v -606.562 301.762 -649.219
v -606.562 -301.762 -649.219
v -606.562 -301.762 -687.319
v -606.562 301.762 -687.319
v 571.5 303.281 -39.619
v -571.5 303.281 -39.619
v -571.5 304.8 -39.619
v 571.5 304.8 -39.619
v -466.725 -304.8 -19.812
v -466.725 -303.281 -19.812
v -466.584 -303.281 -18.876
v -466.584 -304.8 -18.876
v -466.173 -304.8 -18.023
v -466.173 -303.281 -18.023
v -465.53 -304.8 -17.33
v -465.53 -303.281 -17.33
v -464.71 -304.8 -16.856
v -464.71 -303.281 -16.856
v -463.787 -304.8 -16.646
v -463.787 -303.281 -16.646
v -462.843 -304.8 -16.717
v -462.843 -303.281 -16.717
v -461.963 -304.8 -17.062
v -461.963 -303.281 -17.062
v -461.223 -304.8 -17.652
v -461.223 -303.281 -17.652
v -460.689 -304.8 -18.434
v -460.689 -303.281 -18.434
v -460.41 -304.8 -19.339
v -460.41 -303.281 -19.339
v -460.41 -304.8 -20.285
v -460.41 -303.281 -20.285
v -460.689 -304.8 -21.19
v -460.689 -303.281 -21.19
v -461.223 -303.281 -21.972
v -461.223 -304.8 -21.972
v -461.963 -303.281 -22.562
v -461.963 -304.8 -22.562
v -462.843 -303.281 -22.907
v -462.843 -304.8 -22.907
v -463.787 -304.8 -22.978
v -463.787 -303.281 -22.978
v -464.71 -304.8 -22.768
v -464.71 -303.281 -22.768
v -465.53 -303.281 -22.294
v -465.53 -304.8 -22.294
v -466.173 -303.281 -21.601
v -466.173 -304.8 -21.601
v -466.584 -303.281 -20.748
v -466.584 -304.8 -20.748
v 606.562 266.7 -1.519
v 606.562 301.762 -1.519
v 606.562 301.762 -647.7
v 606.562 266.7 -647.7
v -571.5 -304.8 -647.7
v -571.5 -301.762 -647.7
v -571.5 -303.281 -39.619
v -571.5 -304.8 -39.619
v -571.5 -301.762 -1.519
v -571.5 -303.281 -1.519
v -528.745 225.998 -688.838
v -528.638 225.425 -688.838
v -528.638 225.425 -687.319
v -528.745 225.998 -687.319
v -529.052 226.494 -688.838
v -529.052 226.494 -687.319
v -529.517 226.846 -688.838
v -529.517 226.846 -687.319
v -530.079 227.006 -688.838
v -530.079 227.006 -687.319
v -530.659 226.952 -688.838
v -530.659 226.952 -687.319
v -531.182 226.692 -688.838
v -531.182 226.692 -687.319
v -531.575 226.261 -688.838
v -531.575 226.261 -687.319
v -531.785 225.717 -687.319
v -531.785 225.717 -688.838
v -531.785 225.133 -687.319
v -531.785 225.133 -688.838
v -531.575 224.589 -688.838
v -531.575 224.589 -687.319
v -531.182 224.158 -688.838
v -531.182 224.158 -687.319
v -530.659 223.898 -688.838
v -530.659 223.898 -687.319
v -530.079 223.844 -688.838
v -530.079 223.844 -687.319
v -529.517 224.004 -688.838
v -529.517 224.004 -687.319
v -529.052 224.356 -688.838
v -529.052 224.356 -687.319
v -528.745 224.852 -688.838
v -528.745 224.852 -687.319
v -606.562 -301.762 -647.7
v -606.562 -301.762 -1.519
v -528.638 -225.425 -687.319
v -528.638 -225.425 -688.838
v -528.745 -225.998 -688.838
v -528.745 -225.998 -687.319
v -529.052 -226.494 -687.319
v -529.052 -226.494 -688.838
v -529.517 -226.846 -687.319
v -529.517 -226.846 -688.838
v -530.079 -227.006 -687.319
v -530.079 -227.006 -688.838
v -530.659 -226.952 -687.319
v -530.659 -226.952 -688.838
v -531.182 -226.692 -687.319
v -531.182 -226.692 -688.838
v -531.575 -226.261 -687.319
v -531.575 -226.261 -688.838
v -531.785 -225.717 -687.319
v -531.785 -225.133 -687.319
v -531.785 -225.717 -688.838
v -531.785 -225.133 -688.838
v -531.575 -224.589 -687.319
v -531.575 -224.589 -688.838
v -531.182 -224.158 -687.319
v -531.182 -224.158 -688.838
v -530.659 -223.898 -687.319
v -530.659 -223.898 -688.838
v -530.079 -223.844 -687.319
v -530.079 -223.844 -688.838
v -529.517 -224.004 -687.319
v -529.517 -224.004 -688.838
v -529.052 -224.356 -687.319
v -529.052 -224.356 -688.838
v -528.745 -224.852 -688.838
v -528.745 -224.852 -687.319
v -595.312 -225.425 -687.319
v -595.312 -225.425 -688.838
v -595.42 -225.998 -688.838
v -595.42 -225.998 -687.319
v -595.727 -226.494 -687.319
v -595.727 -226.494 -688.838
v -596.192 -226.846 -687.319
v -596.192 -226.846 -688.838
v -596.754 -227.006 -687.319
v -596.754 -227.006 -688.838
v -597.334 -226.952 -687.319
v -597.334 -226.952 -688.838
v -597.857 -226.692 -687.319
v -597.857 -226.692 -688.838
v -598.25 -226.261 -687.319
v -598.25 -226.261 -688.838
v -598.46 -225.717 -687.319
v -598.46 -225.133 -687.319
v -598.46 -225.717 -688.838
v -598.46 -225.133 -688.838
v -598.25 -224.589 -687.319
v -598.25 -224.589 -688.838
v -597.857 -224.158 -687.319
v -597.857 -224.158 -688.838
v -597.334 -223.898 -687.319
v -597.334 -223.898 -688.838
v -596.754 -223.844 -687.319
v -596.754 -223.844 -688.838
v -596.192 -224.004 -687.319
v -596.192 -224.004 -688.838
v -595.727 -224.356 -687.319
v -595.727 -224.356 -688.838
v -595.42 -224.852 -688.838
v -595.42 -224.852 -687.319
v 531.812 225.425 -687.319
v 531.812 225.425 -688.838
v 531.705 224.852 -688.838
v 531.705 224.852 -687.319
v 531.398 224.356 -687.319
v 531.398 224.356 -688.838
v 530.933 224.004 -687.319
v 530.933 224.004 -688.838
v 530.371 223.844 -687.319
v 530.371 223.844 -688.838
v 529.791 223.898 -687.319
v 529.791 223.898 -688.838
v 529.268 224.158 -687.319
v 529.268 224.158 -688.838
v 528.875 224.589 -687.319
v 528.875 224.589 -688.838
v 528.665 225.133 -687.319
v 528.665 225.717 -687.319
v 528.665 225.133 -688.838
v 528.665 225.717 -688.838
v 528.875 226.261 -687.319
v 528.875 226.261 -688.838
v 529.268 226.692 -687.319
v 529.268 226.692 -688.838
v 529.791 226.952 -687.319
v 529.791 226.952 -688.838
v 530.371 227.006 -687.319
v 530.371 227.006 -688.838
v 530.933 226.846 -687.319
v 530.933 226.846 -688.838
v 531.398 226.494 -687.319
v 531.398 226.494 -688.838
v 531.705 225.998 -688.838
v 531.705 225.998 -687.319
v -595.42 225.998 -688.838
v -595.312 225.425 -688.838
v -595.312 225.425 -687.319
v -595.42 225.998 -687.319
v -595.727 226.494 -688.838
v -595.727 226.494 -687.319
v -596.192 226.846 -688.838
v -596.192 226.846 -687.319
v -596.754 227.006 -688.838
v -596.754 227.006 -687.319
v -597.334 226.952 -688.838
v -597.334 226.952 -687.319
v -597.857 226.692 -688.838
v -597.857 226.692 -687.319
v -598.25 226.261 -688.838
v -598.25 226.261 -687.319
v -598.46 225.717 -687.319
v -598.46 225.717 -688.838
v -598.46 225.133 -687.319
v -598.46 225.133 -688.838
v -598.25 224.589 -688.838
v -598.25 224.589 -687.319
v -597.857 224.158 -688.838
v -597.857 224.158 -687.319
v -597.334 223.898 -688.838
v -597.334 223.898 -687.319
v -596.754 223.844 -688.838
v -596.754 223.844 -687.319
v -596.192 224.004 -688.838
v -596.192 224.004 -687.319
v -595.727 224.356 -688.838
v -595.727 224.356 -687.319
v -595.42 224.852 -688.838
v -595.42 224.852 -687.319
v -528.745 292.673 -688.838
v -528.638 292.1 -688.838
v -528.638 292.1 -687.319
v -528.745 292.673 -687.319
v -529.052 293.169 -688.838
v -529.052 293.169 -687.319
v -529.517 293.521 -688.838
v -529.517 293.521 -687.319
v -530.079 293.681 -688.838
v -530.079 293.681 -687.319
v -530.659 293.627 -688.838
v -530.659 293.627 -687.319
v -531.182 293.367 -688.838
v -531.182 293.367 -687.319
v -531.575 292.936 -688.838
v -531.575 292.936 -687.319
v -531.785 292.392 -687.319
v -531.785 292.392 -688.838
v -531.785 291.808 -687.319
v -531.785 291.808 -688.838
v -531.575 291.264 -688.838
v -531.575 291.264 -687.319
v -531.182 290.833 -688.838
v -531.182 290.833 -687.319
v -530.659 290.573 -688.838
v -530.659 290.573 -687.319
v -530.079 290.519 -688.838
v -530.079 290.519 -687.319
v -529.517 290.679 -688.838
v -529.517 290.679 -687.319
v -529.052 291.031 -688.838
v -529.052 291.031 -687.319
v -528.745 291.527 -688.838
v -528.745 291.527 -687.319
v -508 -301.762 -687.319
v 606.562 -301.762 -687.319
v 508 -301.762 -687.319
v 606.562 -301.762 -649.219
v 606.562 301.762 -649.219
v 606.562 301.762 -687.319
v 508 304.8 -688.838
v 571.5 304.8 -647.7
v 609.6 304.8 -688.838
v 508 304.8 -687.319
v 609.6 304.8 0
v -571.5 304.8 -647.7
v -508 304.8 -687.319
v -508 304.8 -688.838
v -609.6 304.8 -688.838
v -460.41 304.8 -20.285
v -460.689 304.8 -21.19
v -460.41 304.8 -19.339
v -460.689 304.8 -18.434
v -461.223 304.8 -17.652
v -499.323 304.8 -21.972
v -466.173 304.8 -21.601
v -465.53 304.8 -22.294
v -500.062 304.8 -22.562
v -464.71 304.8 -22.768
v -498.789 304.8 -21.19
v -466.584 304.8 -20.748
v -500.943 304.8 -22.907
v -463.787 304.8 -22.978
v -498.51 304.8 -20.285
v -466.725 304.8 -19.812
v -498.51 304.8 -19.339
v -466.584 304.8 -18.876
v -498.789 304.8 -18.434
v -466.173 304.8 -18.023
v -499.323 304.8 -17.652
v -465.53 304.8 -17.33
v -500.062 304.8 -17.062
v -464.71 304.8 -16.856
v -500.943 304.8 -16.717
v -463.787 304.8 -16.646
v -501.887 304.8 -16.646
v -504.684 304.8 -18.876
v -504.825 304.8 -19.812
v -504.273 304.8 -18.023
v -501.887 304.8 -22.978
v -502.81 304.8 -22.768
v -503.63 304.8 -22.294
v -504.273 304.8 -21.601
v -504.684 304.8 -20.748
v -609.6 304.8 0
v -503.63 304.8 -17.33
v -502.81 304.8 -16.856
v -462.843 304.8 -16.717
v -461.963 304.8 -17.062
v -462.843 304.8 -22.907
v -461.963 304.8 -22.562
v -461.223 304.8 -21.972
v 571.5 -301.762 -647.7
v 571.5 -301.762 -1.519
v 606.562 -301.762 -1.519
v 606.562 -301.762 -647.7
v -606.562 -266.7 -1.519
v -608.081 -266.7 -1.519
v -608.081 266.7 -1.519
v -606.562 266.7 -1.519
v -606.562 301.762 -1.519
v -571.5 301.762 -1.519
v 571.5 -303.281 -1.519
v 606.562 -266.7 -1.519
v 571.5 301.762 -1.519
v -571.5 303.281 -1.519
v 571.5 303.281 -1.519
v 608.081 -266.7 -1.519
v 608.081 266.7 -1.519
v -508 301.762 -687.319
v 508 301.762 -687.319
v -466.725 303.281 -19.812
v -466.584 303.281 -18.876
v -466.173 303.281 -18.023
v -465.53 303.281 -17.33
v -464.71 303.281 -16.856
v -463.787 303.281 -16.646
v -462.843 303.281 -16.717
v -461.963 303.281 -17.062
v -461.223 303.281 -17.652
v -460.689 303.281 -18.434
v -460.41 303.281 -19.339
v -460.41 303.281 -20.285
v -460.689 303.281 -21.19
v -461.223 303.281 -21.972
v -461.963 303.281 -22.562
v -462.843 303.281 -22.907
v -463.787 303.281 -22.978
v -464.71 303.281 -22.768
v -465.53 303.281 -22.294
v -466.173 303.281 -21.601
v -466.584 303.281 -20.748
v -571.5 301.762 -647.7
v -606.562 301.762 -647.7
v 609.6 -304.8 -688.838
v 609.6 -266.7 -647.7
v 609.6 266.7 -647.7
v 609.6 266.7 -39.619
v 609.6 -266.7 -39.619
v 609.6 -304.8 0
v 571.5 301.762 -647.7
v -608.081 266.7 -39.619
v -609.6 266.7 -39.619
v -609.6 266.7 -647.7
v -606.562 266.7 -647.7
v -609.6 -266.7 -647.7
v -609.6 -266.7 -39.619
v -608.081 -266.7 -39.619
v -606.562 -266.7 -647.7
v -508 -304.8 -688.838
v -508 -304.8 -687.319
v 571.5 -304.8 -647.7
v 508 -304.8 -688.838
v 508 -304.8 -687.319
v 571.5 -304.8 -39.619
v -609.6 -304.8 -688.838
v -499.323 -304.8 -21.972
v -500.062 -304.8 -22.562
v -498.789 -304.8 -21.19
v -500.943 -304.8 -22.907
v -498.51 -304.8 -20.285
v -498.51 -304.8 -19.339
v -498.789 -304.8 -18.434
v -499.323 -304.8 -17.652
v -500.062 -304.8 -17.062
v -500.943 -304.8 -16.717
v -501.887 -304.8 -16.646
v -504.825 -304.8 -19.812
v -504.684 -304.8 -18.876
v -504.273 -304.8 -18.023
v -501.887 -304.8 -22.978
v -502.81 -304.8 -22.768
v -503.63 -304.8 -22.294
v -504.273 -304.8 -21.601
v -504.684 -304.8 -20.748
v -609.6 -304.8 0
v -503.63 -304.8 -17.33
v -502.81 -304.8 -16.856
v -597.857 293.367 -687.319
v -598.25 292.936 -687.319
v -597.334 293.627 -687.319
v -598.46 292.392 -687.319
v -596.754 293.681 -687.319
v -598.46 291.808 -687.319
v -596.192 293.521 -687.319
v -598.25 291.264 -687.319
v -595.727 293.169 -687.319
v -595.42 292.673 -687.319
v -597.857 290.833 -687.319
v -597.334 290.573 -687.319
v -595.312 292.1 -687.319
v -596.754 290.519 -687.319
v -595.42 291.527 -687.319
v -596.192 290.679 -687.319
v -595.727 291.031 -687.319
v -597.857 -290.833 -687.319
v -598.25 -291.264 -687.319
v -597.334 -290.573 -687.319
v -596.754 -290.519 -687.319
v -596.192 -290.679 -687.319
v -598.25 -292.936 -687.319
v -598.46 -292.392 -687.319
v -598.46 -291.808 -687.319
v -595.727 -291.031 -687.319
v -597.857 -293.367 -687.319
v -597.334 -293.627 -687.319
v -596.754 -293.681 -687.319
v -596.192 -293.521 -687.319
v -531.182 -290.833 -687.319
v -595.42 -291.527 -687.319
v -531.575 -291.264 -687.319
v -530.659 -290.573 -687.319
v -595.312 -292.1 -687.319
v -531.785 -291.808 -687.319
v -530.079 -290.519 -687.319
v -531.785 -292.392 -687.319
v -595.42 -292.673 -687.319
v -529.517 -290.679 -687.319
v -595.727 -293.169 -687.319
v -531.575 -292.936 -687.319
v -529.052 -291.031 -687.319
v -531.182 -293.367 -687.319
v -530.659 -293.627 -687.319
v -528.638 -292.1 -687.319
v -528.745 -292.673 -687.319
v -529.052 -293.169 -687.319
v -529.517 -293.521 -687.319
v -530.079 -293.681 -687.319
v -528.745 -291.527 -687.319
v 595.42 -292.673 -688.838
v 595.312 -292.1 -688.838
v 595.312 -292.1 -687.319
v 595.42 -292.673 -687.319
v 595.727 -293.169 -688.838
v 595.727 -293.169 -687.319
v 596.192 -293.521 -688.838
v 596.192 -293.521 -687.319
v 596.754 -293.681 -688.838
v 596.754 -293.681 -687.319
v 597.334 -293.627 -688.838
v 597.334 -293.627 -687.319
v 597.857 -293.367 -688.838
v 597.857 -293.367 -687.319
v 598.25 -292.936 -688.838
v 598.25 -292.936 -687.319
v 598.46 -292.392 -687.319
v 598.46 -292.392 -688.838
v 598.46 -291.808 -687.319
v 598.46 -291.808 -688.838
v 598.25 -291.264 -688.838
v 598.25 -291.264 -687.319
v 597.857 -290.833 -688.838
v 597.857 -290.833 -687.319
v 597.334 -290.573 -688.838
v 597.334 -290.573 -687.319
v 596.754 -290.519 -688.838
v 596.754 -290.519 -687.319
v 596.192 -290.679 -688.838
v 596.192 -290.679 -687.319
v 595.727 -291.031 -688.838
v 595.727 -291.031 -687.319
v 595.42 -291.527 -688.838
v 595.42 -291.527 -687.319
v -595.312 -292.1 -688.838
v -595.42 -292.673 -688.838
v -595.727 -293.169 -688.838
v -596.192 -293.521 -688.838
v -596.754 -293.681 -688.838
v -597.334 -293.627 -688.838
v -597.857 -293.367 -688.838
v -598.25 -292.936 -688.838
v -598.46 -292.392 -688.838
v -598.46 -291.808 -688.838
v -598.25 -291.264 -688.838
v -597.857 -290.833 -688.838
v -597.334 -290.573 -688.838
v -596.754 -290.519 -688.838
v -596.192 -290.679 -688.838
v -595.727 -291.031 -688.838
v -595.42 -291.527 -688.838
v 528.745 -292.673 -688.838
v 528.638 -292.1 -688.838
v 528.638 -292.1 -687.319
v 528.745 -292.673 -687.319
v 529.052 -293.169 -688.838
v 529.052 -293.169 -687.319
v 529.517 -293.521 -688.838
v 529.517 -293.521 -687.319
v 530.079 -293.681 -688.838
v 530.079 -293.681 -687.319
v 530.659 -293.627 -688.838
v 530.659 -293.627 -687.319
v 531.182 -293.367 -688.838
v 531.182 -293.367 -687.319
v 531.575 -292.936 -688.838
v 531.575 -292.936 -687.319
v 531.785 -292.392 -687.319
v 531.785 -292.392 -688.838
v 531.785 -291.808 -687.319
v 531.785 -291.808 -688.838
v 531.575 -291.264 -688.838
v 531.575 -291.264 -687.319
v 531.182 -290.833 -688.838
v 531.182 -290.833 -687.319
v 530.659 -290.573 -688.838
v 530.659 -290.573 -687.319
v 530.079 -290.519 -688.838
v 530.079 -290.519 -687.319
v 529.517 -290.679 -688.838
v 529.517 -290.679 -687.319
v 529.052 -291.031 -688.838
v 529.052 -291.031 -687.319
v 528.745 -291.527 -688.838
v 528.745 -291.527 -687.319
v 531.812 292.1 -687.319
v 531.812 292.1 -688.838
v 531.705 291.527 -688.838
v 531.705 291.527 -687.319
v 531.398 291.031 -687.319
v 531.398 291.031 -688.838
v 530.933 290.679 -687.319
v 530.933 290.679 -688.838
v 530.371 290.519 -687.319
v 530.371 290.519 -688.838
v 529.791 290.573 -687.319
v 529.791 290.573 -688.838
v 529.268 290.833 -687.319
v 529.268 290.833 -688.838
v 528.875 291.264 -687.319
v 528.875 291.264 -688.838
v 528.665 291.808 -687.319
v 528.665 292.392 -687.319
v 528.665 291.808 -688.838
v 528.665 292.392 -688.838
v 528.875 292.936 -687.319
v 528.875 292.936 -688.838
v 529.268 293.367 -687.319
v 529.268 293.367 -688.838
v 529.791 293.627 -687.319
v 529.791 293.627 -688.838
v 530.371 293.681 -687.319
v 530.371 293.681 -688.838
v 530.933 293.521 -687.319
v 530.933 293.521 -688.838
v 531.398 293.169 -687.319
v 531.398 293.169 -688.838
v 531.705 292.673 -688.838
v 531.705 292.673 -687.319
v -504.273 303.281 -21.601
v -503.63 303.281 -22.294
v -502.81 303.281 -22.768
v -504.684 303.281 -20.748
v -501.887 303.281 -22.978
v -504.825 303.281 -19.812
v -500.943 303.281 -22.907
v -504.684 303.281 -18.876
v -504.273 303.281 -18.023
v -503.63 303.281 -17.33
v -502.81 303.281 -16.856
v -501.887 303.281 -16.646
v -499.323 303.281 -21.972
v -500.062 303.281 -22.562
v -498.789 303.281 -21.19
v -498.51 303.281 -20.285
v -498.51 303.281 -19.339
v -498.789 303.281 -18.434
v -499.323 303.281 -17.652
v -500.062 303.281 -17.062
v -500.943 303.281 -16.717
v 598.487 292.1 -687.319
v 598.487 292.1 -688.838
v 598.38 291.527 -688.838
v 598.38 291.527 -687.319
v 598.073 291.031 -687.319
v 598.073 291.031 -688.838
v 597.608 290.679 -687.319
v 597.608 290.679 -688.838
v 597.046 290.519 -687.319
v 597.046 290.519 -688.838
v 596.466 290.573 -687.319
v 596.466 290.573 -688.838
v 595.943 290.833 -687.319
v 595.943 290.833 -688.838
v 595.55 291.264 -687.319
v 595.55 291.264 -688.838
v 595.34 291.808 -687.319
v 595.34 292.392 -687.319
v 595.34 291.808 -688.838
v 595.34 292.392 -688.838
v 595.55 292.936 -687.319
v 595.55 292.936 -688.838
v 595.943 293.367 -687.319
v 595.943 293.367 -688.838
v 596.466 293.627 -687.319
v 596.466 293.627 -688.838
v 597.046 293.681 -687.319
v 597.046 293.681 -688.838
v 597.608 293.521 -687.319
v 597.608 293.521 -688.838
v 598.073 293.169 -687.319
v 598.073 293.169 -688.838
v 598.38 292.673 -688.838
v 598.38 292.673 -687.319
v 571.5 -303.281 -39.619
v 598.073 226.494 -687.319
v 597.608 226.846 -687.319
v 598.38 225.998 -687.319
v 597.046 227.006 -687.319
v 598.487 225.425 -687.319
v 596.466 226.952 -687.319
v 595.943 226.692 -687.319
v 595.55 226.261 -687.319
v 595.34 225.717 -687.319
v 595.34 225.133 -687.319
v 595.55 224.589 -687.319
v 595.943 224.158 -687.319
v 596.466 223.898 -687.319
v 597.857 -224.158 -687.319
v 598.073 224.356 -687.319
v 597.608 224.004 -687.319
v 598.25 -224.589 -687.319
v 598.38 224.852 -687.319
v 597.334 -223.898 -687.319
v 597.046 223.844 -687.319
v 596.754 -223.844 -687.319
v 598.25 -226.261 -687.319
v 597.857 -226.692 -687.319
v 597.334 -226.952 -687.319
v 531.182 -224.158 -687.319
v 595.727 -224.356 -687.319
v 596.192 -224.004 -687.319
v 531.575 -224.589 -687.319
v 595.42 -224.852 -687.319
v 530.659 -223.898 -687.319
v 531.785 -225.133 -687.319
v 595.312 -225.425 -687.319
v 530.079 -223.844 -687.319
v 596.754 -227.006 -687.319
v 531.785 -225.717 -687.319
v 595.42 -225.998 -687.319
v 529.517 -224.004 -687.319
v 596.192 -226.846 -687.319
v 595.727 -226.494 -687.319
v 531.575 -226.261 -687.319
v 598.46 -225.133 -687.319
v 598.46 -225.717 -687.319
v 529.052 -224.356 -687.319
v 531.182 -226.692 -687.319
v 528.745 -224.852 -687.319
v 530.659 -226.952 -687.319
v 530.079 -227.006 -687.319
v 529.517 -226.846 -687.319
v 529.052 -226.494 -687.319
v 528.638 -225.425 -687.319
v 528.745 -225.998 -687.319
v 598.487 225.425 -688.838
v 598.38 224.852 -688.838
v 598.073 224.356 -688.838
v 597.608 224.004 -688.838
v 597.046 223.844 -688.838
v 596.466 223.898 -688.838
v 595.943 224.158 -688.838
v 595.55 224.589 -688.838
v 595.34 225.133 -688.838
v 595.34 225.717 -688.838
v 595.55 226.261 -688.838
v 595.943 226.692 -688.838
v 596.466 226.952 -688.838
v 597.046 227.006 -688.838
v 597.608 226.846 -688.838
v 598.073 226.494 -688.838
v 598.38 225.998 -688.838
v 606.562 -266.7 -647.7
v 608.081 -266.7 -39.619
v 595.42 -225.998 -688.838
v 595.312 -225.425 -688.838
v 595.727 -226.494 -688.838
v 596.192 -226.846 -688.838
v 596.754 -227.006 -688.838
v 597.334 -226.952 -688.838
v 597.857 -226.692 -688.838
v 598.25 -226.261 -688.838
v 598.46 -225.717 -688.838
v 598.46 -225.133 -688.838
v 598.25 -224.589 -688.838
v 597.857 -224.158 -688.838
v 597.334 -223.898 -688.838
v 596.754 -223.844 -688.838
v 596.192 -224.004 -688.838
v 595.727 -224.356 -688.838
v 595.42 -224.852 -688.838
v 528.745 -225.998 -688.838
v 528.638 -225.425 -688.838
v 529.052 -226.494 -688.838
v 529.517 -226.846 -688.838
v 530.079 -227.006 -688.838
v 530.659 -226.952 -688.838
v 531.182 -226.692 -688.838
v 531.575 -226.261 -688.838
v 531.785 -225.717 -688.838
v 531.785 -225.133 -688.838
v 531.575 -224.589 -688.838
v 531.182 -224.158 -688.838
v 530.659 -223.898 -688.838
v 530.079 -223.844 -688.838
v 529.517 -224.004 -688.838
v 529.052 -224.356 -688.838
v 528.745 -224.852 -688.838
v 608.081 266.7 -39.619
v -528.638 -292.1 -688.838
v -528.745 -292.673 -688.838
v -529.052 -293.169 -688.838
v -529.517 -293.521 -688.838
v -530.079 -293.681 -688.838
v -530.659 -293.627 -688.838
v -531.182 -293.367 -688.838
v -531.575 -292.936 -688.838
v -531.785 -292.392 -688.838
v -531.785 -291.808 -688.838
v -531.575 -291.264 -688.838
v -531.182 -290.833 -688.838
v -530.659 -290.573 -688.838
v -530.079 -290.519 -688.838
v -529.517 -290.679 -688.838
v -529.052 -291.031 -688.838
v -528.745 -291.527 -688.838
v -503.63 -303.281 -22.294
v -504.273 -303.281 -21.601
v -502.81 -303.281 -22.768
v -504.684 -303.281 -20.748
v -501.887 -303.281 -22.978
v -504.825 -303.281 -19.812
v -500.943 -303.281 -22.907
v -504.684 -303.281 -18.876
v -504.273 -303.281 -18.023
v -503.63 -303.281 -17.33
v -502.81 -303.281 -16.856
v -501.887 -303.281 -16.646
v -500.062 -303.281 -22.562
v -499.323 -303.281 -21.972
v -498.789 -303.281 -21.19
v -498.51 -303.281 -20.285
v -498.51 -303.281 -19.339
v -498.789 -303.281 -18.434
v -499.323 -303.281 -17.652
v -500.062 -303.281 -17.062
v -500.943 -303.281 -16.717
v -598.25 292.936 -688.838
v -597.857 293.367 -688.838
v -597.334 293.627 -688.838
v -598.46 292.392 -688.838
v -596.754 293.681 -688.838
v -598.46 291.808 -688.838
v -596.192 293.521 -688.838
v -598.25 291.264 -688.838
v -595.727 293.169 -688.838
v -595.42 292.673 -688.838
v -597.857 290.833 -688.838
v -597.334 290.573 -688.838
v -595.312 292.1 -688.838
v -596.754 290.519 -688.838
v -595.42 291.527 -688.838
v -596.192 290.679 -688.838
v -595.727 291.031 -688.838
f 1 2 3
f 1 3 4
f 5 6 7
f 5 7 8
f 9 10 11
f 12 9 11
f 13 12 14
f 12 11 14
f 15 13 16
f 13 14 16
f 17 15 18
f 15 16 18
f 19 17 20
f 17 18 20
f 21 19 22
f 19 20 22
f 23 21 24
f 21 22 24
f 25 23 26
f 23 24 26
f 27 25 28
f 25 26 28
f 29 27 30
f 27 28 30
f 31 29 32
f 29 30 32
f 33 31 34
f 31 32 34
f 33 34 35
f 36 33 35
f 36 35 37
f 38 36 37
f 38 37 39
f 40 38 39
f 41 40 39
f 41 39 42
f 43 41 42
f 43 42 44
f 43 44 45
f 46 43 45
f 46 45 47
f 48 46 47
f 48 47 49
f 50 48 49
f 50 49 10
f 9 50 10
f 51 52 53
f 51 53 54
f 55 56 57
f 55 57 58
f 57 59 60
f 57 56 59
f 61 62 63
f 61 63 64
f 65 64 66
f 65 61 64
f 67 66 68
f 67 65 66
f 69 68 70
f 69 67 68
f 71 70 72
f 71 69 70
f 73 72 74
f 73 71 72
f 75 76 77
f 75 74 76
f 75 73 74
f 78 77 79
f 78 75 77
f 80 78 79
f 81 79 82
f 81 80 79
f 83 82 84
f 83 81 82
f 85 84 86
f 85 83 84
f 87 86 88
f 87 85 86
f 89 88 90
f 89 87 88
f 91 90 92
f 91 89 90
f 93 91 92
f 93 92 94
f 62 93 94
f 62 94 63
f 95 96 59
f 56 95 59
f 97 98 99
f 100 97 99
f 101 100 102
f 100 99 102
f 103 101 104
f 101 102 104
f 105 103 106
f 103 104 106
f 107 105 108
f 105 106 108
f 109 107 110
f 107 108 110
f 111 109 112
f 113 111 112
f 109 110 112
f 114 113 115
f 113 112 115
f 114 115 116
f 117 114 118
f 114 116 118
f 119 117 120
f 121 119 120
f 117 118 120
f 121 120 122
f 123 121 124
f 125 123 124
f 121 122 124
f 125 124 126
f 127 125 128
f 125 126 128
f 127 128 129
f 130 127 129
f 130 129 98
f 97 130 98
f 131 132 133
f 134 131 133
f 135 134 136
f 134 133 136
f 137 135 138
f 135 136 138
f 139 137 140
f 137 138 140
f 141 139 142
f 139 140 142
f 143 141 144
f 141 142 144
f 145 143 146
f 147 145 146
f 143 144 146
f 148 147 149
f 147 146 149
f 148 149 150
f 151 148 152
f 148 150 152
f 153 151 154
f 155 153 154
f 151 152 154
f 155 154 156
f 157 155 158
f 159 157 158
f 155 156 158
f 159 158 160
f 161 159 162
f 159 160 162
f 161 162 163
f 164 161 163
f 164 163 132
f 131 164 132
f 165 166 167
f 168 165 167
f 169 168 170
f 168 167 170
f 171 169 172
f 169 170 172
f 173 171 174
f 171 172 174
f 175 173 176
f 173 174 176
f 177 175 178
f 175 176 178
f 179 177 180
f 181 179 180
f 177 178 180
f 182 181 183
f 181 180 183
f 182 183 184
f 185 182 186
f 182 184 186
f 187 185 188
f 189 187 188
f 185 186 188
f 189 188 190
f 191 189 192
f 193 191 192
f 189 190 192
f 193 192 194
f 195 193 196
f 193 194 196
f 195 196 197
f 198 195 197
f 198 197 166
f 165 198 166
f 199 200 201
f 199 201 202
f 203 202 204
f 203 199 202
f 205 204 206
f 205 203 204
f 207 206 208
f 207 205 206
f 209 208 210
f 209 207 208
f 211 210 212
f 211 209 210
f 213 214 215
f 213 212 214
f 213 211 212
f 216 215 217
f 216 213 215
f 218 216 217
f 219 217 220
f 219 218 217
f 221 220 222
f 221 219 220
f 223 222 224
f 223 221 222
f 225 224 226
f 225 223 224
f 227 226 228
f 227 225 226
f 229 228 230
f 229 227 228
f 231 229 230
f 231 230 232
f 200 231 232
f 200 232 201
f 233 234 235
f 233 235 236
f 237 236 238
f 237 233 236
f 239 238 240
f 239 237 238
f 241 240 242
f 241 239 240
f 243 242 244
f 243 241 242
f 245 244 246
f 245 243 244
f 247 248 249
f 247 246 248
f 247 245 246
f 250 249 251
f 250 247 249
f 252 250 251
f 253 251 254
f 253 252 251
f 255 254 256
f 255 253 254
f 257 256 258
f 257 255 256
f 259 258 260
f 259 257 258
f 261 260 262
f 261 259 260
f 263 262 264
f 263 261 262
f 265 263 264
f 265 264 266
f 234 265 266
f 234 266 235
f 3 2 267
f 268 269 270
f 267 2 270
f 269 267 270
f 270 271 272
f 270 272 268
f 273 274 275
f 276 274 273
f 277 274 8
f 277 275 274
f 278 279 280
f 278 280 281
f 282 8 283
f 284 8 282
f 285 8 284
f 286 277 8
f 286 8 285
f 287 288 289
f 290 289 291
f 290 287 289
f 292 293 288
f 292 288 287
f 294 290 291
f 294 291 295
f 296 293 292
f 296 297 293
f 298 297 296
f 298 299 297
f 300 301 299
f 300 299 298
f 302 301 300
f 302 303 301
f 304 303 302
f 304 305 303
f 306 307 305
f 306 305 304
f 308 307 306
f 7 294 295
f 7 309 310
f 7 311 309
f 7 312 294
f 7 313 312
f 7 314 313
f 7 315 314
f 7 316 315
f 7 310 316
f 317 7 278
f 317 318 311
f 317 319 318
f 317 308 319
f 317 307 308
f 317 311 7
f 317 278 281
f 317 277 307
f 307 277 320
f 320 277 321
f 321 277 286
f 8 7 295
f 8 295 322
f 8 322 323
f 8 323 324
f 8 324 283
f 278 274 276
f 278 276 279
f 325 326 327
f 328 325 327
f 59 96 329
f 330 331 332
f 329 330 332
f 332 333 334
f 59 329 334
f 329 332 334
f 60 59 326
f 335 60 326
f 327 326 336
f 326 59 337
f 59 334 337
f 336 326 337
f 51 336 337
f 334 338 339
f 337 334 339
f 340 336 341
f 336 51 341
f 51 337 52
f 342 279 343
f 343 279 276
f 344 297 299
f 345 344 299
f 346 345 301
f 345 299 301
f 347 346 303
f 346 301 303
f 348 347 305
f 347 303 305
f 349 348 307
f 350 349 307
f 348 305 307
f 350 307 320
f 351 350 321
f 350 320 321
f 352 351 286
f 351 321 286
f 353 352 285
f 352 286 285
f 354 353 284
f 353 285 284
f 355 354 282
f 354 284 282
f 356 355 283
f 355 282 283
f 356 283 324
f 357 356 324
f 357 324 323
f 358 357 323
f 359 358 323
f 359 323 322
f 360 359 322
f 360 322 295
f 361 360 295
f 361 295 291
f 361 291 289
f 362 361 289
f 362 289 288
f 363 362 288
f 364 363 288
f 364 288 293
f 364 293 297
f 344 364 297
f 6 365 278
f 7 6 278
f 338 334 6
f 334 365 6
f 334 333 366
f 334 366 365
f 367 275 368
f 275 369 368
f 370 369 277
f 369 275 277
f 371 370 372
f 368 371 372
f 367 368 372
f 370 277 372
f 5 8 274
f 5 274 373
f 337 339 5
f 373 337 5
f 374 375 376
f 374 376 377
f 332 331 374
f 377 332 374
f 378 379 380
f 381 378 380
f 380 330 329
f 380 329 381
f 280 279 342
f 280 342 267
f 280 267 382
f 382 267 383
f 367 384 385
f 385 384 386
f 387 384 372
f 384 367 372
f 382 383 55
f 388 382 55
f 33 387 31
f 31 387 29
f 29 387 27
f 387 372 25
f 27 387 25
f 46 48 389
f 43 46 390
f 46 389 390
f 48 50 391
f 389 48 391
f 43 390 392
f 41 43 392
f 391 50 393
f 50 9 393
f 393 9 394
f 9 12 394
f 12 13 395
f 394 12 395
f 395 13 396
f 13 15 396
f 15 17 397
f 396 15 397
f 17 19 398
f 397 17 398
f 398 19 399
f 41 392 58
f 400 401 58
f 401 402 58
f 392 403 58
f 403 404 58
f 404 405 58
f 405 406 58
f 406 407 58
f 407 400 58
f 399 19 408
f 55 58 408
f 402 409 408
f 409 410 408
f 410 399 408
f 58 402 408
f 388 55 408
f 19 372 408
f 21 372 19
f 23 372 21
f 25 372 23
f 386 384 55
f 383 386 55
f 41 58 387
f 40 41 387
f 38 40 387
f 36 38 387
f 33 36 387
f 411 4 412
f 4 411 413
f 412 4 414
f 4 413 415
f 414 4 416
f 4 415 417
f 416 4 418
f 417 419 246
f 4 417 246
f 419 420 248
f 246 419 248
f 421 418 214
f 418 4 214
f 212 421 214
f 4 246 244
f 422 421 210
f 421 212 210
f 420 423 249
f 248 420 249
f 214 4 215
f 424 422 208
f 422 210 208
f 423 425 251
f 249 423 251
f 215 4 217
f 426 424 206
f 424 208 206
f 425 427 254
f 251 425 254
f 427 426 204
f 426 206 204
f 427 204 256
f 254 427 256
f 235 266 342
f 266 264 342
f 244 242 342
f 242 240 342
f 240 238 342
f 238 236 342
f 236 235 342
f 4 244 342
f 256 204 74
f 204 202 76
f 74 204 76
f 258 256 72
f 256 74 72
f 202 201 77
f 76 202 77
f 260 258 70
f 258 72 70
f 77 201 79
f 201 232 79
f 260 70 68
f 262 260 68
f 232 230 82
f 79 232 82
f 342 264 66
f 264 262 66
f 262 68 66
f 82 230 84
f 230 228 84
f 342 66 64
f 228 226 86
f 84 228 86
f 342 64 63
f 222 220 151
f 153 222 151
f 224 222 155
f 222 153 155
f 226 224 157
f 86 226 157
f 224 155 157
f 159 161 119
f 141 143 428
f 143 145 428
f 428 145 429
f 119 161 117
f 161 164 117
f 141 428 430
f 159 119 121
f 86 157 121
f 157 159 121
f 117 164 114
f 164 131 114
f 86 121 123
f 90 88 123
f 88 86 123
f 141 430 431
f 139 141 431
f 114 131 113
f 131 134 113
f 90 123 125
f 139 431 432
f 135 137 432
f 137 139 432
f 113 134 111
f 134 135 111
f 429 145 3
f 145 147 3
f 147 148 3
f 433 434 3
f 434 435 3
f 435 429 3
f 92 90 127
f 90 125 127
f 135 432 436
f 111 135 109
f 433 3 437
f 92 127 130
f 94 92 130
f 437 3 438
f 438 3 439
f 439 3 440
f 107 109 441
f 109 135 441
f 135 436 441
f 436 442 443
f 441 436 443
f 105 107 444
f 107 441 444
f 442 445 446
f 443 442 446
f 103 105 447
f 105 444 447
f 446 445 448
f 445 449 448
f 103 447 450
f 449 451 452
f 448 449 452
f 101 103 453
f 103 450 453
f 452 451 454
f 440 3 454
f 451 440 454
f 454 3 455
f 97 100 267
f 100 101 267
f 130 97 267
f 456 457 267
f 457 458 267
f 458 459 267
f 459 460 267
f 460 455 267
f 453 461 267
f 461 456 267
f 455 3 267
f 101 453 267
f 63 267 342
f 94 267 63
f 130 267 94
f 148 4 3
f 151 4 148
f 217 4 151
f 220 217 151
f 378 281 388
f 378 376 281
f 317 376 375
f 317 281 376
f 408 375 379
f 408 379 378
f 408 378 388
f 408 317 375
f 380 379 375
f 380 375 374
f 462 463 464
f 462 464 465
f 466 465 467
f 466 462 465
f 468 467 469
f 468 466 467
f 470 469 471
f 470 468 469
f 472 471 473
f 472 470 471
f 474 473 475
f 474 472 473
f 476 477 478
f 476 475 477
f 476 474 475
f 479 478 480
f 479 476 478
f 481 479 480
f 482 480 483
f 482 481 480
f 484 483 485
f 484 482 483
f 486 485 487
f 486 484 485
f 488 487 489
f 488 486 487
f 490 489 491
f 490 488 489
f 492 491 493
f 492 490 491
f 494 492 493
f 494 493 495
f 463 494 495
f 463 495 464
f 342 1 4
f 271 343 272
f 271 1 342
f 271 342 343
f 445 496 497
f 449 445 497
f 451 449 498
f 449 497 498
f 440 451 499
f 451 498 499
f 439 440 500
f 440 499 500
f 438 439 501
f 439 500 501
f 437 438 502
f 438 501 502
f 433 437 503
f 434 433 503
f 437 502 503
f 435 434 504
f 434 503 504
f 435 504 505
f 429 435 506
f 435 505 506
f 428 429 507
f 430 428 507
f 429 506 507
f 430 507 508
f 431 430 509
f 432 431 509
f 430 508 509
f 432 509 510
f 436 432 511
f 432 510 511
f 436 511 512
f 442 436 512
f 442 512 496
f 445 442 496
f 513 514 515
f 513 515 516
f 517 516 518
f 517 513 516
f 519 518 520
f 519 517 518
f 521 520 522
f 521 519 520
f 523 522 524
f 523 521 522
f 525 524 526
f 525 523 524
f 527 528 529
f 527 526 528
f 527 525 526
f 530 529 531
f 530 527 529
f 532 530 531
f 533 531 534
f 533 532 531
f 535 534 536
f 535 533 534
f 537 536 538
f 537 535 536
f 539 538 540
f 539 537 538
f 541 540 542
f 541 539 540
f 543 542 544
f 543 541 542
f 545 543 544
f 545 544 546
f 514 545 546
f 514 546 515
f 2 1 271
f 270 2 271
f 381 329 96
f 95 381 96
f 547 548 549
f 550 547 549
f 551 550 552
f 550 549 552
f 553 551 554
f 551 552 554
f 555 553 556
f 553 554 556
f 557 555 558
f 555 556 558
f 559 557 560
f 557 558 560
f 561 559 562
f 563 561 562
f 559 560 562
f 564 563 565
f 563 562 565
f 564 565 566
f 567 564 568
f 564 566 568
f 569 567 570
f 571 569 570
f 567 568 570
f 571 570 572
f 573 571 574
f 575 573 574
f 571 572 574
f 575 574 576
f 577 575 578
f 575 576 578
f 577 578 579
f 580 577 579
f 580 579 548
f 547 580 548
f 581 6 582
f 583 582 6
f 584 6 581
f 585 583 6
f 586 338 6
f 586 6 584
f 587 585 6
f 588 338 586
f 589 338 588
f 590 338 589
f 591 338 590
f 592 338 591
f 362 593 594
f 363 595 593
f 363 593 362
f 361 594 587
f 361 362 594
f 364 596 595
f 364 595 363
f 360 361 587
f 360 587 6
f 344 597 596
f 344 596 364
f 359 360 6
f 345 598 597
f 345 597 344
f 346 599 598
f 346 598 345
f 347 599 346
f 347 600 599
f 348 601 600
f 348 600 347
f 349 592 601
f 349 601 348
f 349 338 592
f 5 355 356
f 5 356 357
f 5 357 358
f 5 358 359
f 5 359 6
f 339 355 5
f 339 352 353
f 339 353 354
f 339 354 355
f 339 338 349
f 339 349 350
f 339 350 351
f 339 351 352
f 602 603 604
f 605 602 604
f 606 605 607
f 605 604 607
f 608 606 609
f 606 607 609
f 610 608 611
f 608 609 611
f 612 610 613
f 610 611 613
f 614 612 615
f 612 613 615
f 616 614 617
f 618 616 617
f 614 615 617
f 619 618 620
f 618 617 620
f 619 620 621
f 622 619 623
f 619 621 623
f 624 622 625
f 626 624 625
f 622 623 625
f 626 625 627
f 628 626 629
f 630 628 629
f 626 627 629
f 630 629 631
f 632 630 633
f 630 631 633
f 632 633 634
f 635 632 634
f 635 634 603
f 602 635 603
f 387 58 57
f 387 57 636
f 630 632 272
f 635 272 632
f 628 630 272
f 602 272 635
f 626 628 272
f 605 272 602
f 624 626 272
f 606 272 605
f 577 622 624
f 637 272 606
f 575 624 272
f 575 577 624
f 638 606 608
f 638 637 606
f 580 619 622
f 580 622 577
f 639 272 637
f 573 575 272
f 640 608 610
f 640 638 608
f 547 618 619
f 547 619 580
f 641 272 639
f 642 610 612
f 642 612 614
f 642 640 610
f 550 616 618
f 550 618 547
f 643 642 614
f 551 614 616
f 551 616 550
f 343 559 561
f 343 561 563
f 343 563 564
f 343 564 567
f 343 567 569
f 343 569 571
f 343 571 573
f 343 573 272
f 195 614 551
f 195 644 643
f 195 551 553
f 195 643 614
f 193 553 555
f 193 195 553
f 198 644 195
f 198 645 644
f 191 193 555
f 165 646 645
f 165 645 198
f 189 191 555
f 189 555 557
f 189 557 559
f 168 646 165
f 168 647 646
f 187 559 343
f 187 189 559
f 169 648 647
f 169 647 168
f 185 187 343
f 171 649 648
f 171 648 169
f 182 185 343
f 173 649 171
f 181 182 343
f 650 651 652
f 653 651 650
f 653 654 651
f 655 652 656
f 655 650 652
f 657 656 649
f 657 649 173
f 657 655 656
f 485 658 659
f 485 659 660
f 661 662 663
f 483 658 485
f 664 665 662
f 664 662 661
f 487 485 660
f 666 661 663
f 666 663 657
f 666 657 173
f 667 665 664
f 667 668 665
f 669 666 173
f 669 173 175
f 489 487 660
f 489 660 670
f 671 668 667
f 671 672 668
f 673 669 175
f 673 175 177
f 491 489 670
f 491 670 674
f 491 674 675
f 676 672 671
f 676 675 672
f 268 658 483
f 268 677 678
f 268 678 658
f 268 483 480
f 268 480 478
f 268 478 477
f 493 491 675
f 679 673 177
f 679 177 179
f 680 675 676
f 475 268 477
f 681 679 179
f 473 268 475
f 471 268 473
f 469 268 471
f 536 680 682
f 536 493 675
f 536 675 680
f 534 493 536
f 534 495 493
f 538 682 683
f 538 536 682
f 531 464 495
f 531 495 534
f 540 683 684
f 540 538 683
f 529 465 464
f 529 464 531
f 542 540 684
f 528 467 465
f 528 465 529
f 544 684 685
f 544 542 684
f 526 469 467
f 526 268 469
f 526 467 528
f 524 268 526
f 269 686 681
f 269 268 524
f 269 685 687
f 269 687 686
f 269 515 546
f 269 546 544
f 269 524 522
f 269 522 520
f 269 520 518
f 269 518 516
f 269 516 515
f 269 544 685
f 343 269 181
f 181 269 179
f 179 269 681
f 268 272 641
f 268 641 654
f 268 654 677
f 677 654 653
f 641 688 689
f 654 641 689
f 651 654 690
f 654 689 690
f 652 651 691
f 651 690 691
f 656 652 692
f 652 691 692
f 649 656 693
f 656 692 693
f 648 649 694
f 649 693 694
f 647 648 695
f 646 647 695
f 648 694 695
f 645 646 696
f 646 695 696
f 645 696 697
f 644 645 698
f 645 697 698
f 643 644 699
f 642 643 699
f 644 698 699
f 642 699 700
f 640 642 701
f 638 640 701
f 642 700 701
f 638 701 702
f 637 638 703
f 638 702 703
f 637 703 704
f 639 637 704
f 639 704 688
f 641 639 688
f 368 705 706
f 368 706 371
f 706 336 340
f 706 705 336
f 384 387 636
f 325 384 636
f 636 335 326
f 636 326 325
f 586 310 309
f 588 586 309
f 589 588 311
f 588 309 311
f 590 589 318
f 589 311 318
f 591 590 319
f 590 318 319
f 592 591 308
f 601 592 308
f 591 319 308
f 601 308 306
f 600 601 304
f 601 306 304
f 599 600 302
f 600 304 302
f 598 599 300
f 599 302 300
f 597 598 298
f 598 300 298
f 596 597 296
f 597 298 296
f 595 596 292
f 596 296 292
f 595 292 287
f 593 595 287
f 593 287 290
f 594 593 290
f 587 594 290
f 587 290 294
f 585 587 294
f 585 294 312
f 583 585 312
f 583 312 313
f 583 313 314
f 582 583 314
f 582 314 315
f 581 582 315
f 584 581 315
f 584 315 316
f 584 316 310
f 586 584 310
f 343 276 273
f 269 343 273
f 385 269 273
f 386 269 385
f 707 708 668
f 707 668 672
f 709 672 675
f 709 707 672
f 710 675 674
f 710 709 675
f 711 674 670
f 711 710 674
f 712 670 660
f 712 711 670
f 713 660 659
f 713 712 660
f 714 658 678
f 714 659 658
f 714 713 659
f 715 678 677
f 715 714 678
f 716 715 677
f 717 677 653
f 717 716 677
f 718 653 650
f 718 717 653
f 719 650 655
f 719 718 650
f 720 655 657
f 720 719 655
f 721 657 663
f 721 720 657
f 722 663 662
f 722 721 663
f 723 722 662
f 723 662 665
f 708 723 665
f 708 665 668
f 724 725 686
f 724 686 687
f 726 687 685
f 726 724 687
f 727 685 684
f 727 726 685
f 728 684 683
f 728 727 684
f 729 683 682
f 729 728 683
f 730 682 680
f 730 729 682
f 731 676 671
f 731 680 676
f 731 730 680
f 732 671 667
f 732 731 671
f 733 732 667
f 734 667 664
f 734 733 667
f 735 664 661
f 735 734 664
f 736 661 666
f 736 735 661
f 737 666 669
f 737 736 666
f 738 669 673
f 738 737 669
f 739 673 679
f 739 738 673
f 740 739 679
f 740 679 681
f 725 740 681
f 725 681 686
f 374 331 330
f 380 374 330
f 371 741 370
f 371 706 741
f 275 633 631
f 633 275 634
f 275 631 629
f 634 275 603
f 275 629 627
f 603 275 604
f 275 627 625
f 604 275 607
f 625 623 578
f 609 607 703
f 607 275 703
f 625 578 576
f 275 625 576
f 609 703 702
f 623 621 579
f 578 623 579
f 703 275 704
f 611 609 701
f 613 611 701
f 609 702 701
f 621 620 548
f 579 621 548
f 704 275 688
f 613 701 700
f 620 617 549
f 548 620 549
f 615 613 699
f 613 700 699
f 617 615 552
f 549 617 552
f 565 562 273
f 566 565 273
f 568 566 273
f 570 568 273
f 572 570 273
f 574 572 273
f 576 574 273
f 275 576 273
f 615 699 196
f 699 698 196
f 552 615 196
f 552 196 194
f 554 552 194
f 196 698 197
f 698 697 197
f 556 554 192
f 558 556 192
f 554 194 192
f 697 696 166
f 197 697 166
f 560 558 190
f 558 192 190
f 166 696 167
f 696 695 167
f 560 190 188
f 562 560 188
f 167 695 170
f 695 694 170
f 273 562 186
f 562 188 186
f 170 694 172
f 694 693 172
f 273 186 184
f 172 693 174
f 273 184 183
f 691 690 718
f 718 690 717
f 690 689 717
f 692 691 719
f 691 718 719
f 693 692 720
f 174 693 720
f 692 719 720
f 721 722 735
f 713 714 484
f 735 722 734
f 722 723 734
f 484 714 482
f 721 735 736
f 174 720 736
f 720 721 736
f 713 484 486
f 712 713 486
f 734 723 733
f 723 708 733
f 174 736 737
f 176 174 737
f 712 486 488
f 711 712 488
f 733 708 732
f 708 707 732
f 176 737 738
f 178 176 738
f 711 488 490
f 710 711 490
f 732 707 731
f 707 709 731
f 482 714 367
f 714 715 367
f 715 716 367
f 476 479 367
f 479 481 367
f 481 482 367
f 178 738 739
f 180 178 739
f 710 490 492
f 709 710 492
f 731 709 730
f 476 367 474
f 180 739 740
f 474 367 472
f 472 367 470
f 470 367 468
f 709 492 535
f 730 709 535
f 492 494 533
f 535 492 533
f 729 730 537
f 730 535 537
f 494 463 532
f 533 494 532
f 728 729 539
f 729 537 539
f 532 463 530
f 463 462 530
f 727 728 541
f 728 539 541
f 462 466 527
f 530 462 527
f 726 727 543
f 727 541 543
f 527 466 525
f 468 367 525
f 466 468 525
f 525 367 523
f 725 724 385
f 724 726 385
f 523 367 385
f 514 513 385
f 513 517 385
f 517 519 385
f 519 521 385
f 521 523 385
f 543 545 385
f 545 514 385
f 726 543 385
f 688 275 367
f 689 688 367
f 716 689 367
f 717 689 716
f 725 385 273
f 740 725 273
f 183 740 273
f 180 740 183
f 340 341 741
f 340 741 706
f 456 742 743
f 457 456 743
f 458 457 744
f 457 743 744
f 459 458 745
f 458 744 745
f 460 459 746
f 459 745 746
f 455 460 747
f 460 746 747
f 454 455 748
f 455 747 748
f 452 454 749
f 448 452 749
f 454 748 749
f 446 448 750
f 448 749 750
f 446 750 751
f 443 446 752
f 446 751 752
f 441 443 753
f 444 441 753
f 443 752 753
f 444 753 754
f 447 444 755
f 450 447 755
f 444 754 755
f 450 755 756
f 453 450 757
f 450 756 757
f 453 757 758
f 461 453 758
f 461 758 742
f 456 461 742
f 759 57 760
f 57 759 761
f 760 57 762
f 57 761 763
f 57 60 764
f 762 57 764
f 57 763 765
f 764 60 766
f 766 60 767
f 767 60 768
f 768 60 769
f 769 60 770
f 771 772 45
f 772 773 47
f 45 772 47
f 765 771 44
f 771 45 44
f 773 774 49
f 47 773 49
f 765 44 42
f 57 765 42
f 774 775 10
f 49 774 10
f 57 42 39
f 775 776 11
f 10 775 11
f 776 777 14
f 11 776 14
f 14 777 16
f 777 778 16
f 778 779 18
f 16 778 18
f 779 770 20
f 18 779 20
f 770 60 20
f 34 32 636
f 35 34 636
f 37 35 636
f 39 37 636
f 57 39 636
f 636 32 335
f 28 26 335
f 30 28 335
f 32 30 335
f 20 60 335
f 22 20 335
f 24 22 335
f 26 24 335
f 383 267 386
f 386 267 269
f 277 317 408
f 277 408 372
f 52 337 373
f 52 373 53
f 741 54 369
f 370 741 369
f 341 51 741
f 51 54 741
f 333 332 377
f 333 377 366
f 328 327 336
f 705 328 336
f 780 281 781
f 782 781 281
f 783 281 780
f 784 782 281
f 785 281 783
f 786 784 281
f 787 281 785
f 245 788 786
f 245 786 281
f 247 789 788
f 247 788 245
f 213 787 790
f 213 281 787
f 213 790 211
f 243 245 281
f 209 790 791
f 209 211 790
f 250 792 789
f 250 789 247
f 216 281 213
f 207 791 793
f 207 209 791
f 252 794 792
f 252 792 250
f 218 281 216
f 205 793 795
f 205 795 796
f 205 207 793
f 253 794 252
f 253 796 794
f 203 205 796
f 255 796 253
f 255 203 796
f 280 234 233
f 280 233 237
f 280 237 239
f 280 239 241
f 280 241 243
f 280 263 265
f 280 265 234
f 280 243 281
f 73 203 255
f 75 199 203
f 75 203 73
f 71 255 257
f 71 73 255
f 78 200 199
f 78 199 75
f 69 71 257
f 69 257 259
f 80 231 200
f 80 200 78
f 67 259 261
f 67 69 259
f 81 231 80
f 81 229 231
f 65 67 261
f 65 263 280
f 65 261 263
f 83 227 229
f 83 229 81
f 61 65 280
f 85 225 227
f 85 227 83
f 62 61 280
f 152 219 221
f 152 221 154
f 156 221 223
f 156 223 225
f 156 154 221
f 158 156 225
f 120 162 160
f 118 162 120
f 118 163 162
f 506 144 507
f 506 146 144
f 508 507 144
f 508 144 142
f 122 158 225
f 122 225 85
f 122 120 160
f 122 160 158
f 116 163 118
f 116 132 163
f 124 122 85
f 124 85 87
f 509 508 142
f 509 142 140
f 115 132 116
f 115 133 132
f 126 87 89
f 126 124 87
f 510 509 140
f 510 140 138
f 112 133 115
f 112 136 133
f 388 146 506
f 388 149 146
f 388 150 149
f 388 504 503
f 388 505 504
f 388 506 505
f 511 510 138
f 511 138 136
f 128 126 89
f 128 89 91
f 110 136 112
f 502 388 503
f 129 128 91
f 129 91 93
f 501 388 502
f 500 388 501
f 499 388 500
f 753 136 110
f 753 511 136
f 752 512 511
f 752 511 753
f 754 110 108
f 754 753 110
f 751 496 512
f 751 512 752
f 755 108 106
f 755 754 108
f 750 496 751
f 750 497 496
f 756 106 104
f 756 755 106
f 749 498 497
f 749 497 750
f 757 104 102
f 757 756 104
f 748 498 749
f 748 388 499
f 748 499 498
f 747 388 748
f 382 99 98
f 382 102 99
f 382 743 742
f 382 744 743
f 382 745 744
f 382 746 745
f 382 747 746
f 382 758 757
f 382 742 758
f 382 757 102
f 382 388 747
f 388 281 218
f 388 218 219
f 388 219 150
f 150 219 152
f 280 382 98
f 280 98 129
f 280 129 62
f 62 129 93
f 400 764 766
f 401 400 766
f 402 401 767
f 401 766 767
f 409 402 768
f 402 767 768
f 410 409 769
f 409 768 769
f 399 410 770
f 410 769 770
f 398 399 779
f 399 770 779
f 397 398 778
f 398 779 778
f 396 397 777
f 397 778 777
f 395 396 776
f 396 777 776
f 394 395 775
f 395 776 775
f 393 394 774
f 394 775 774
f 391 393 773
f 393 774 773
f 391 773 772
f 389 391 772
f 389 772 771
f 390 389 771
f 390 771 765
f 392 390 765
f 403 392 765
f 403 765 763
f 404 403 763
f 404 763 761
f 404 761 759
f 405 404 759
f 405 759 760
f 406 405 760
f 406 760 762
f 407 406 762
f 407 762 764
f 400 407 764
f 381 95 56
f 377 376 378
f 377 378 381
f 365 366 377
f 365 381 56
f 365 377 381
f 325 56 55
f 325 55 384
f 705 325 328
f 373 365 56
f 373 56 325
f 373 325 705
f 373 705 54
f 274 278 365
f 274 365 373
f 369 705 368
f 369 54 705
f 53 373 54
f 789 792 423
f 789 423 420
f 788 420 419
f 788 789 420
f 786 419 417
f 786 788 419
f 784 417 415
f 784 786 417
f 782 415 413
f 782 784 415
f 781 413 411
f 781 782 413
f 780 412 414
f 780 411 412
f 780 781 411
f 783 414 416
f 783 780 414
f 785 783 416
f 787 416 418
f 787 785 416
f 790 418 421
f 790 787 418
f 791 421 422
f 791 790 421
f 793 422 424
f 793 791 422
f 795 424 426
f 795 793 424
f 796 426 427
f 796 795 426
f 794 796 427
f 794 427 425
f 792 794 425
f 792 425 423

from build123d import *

# Parameters (mm, degrees)
F0_W              = 1219.2
F0_H              = 609.6
F1_DEPTH          = 1.51892
F2_W              = 1219.2
F2_H              = 609.6
F2_W_2            = 1216.16216
F2_H_2            = 606.56216
F3_DEPTH          = 38.1
F5_DEPTH          = 685.8
F7_W              = 1219.2
F7_H              = 609.6
F8_DEPTH          = 1.51892
F9_W              = 1219.2
F9_H              = 609.6
F9_W_2            = 1213.12432
F9_H_2            = 603.52432
F10_DEPTH         = 38.1
F11_W             = 101.6
F11_H             = 609.6
F12_DEPTH         = 1.51892
F13_R             = 1.5875
F14_DEPTH         = 1.651
F14_COPIES2_COUNT = 2
F14_COPIES2_PITCH = 1240.259203
F16_D             = 6.35


# Not quite as in the source:
# - a pattern or mirror of a feature is missing from the dataset's text; its kind, count and spacing are read off the source's solid


with BuildPart() as f1:
    # F0 (on Top) → F1 (new body)
    with BuildSketch(Plane.XY):
        Rectangle(F0_W, F0_H)
    extrude(amount=-F1_DEPTH)

    # F2 (on face) → F3 (join)
    with BuildSketch(Plane(origin=(0, 0, -1.51892), x_dir=(1, 0, 0), z_dir=(0, 0, -1))):
        Rectangle(F2_W, F2_H)
        Rectangle(F2_W_2, F2_H_2, mode=Mode.SUBTRACT)
    extrude(amount=F3_DEPTH)

    # F4 (on face) → F5 (join)
    with BuildSketch(Plane(origin=(0, 0, -1.51892), x_dir=(1, 0, 0), z_dir=(0, 0, -1))):
        Polygon((-571.5, 301.76216), (-571.5, 304.8), (-609.6, 304.8), (-609.6, 266.7), (-606.56216, 266.7), (-606.56216, 301.76216), align=None)
        Polygon((571.5, 304.8), (571.5, 301.76216), (606.56216, 301.76216), (606.56216, 266.7), (609.6, 266.7), (609.6, 304.8), align=None)
    f5 = extrude(amount=F5_DEPTH)

    # F5_copies: F5 across plane
    add(f5.mirror(Plane.ZX))

    # F7 (on offset) → F8 (join)
    with BuildSketch(Plane.XY.offset(-647.7)):
        Rectangle(F7_W, F7_H)
    extrude(amount=-F8_DEPTH)

    # F9 (on face) → F10 (join)
    with BuildSketch(Plane(origin=(0, 0, -649.21892), x_dir=(1, 0, 0), z_dir=(0, 0, -1))):
        Rectangle(F9_W, F9_H)
        Rectangle(F9_W_2, F9_H_2, mode=Mode.SUBTRACT)
    extrude(amount=F10_DEPTH)

    # F11 (on face) → F12 (join)
    with BuildSketch(Plane(origin=(0, 0, -687.31892), x_dir=(1, 0, 0), z_dir=(0, 0, -1))):
        with Locations((-558.8, 0)):
            Rectangle(F11_W, F11_H)
    f12 = extrude(amount=F12_DEPTH)

    # F12_copies: F12 across plane
    add(f12.mirror(Plane(origin=(0, 0, 0), x_dir=(0, 0, 1), z_dir=(1, 0, 0))))

    # F13 (on face) → F14 (cut)
    with BuildSketch(Plane(origin=(0, 0, -688.83784), x_dir=(1, 0, 0), z_dir=(0, 0, -1))):
        with Locations((-596.9, 292.1)):
            Circle(F13_R)
        with Locations((-596.9, 225.425)):
            Circle(F13_R)
        with Locations((-530.225, 292.1)):
            Circle(F13_R)
        with Locations((-530.225, 225.425)):
            Circle(F13_R)
    f14 = extrude(amount=-F14_DEPTH, mode=Mode.SUBTRACT)

    # F14_copies: F14 across plane
    add(f14.mirror(Plane(origin=(0, 0, 0), x_dir=(0, 0, 1), z_dir=(1, 0, 0))), mode=Mode.SUBTRACT)

    # F14_copies1: F14 across plane
    add(f14.mirror(Plane.ZX), mode=Mode.SUBTRACT)

    # F14_copies2: F14 ×2
    with Locations(*[Vector(0.9087818071, 0.4172716466, 0) * (i * F14_COPIES2_PITCH) for i in range(1, F14_COPIES2_COUNT)]):
        add(f14, mode=Mode.SUBTRACT)

    # F16 (through all)
    with Locations(Plane.XZ.offset(304.8)):
        with Locations((-501.65, -19.812), (-463.55, -19.812)):
            Hole(F16_D / 2)


solid = f1.part
